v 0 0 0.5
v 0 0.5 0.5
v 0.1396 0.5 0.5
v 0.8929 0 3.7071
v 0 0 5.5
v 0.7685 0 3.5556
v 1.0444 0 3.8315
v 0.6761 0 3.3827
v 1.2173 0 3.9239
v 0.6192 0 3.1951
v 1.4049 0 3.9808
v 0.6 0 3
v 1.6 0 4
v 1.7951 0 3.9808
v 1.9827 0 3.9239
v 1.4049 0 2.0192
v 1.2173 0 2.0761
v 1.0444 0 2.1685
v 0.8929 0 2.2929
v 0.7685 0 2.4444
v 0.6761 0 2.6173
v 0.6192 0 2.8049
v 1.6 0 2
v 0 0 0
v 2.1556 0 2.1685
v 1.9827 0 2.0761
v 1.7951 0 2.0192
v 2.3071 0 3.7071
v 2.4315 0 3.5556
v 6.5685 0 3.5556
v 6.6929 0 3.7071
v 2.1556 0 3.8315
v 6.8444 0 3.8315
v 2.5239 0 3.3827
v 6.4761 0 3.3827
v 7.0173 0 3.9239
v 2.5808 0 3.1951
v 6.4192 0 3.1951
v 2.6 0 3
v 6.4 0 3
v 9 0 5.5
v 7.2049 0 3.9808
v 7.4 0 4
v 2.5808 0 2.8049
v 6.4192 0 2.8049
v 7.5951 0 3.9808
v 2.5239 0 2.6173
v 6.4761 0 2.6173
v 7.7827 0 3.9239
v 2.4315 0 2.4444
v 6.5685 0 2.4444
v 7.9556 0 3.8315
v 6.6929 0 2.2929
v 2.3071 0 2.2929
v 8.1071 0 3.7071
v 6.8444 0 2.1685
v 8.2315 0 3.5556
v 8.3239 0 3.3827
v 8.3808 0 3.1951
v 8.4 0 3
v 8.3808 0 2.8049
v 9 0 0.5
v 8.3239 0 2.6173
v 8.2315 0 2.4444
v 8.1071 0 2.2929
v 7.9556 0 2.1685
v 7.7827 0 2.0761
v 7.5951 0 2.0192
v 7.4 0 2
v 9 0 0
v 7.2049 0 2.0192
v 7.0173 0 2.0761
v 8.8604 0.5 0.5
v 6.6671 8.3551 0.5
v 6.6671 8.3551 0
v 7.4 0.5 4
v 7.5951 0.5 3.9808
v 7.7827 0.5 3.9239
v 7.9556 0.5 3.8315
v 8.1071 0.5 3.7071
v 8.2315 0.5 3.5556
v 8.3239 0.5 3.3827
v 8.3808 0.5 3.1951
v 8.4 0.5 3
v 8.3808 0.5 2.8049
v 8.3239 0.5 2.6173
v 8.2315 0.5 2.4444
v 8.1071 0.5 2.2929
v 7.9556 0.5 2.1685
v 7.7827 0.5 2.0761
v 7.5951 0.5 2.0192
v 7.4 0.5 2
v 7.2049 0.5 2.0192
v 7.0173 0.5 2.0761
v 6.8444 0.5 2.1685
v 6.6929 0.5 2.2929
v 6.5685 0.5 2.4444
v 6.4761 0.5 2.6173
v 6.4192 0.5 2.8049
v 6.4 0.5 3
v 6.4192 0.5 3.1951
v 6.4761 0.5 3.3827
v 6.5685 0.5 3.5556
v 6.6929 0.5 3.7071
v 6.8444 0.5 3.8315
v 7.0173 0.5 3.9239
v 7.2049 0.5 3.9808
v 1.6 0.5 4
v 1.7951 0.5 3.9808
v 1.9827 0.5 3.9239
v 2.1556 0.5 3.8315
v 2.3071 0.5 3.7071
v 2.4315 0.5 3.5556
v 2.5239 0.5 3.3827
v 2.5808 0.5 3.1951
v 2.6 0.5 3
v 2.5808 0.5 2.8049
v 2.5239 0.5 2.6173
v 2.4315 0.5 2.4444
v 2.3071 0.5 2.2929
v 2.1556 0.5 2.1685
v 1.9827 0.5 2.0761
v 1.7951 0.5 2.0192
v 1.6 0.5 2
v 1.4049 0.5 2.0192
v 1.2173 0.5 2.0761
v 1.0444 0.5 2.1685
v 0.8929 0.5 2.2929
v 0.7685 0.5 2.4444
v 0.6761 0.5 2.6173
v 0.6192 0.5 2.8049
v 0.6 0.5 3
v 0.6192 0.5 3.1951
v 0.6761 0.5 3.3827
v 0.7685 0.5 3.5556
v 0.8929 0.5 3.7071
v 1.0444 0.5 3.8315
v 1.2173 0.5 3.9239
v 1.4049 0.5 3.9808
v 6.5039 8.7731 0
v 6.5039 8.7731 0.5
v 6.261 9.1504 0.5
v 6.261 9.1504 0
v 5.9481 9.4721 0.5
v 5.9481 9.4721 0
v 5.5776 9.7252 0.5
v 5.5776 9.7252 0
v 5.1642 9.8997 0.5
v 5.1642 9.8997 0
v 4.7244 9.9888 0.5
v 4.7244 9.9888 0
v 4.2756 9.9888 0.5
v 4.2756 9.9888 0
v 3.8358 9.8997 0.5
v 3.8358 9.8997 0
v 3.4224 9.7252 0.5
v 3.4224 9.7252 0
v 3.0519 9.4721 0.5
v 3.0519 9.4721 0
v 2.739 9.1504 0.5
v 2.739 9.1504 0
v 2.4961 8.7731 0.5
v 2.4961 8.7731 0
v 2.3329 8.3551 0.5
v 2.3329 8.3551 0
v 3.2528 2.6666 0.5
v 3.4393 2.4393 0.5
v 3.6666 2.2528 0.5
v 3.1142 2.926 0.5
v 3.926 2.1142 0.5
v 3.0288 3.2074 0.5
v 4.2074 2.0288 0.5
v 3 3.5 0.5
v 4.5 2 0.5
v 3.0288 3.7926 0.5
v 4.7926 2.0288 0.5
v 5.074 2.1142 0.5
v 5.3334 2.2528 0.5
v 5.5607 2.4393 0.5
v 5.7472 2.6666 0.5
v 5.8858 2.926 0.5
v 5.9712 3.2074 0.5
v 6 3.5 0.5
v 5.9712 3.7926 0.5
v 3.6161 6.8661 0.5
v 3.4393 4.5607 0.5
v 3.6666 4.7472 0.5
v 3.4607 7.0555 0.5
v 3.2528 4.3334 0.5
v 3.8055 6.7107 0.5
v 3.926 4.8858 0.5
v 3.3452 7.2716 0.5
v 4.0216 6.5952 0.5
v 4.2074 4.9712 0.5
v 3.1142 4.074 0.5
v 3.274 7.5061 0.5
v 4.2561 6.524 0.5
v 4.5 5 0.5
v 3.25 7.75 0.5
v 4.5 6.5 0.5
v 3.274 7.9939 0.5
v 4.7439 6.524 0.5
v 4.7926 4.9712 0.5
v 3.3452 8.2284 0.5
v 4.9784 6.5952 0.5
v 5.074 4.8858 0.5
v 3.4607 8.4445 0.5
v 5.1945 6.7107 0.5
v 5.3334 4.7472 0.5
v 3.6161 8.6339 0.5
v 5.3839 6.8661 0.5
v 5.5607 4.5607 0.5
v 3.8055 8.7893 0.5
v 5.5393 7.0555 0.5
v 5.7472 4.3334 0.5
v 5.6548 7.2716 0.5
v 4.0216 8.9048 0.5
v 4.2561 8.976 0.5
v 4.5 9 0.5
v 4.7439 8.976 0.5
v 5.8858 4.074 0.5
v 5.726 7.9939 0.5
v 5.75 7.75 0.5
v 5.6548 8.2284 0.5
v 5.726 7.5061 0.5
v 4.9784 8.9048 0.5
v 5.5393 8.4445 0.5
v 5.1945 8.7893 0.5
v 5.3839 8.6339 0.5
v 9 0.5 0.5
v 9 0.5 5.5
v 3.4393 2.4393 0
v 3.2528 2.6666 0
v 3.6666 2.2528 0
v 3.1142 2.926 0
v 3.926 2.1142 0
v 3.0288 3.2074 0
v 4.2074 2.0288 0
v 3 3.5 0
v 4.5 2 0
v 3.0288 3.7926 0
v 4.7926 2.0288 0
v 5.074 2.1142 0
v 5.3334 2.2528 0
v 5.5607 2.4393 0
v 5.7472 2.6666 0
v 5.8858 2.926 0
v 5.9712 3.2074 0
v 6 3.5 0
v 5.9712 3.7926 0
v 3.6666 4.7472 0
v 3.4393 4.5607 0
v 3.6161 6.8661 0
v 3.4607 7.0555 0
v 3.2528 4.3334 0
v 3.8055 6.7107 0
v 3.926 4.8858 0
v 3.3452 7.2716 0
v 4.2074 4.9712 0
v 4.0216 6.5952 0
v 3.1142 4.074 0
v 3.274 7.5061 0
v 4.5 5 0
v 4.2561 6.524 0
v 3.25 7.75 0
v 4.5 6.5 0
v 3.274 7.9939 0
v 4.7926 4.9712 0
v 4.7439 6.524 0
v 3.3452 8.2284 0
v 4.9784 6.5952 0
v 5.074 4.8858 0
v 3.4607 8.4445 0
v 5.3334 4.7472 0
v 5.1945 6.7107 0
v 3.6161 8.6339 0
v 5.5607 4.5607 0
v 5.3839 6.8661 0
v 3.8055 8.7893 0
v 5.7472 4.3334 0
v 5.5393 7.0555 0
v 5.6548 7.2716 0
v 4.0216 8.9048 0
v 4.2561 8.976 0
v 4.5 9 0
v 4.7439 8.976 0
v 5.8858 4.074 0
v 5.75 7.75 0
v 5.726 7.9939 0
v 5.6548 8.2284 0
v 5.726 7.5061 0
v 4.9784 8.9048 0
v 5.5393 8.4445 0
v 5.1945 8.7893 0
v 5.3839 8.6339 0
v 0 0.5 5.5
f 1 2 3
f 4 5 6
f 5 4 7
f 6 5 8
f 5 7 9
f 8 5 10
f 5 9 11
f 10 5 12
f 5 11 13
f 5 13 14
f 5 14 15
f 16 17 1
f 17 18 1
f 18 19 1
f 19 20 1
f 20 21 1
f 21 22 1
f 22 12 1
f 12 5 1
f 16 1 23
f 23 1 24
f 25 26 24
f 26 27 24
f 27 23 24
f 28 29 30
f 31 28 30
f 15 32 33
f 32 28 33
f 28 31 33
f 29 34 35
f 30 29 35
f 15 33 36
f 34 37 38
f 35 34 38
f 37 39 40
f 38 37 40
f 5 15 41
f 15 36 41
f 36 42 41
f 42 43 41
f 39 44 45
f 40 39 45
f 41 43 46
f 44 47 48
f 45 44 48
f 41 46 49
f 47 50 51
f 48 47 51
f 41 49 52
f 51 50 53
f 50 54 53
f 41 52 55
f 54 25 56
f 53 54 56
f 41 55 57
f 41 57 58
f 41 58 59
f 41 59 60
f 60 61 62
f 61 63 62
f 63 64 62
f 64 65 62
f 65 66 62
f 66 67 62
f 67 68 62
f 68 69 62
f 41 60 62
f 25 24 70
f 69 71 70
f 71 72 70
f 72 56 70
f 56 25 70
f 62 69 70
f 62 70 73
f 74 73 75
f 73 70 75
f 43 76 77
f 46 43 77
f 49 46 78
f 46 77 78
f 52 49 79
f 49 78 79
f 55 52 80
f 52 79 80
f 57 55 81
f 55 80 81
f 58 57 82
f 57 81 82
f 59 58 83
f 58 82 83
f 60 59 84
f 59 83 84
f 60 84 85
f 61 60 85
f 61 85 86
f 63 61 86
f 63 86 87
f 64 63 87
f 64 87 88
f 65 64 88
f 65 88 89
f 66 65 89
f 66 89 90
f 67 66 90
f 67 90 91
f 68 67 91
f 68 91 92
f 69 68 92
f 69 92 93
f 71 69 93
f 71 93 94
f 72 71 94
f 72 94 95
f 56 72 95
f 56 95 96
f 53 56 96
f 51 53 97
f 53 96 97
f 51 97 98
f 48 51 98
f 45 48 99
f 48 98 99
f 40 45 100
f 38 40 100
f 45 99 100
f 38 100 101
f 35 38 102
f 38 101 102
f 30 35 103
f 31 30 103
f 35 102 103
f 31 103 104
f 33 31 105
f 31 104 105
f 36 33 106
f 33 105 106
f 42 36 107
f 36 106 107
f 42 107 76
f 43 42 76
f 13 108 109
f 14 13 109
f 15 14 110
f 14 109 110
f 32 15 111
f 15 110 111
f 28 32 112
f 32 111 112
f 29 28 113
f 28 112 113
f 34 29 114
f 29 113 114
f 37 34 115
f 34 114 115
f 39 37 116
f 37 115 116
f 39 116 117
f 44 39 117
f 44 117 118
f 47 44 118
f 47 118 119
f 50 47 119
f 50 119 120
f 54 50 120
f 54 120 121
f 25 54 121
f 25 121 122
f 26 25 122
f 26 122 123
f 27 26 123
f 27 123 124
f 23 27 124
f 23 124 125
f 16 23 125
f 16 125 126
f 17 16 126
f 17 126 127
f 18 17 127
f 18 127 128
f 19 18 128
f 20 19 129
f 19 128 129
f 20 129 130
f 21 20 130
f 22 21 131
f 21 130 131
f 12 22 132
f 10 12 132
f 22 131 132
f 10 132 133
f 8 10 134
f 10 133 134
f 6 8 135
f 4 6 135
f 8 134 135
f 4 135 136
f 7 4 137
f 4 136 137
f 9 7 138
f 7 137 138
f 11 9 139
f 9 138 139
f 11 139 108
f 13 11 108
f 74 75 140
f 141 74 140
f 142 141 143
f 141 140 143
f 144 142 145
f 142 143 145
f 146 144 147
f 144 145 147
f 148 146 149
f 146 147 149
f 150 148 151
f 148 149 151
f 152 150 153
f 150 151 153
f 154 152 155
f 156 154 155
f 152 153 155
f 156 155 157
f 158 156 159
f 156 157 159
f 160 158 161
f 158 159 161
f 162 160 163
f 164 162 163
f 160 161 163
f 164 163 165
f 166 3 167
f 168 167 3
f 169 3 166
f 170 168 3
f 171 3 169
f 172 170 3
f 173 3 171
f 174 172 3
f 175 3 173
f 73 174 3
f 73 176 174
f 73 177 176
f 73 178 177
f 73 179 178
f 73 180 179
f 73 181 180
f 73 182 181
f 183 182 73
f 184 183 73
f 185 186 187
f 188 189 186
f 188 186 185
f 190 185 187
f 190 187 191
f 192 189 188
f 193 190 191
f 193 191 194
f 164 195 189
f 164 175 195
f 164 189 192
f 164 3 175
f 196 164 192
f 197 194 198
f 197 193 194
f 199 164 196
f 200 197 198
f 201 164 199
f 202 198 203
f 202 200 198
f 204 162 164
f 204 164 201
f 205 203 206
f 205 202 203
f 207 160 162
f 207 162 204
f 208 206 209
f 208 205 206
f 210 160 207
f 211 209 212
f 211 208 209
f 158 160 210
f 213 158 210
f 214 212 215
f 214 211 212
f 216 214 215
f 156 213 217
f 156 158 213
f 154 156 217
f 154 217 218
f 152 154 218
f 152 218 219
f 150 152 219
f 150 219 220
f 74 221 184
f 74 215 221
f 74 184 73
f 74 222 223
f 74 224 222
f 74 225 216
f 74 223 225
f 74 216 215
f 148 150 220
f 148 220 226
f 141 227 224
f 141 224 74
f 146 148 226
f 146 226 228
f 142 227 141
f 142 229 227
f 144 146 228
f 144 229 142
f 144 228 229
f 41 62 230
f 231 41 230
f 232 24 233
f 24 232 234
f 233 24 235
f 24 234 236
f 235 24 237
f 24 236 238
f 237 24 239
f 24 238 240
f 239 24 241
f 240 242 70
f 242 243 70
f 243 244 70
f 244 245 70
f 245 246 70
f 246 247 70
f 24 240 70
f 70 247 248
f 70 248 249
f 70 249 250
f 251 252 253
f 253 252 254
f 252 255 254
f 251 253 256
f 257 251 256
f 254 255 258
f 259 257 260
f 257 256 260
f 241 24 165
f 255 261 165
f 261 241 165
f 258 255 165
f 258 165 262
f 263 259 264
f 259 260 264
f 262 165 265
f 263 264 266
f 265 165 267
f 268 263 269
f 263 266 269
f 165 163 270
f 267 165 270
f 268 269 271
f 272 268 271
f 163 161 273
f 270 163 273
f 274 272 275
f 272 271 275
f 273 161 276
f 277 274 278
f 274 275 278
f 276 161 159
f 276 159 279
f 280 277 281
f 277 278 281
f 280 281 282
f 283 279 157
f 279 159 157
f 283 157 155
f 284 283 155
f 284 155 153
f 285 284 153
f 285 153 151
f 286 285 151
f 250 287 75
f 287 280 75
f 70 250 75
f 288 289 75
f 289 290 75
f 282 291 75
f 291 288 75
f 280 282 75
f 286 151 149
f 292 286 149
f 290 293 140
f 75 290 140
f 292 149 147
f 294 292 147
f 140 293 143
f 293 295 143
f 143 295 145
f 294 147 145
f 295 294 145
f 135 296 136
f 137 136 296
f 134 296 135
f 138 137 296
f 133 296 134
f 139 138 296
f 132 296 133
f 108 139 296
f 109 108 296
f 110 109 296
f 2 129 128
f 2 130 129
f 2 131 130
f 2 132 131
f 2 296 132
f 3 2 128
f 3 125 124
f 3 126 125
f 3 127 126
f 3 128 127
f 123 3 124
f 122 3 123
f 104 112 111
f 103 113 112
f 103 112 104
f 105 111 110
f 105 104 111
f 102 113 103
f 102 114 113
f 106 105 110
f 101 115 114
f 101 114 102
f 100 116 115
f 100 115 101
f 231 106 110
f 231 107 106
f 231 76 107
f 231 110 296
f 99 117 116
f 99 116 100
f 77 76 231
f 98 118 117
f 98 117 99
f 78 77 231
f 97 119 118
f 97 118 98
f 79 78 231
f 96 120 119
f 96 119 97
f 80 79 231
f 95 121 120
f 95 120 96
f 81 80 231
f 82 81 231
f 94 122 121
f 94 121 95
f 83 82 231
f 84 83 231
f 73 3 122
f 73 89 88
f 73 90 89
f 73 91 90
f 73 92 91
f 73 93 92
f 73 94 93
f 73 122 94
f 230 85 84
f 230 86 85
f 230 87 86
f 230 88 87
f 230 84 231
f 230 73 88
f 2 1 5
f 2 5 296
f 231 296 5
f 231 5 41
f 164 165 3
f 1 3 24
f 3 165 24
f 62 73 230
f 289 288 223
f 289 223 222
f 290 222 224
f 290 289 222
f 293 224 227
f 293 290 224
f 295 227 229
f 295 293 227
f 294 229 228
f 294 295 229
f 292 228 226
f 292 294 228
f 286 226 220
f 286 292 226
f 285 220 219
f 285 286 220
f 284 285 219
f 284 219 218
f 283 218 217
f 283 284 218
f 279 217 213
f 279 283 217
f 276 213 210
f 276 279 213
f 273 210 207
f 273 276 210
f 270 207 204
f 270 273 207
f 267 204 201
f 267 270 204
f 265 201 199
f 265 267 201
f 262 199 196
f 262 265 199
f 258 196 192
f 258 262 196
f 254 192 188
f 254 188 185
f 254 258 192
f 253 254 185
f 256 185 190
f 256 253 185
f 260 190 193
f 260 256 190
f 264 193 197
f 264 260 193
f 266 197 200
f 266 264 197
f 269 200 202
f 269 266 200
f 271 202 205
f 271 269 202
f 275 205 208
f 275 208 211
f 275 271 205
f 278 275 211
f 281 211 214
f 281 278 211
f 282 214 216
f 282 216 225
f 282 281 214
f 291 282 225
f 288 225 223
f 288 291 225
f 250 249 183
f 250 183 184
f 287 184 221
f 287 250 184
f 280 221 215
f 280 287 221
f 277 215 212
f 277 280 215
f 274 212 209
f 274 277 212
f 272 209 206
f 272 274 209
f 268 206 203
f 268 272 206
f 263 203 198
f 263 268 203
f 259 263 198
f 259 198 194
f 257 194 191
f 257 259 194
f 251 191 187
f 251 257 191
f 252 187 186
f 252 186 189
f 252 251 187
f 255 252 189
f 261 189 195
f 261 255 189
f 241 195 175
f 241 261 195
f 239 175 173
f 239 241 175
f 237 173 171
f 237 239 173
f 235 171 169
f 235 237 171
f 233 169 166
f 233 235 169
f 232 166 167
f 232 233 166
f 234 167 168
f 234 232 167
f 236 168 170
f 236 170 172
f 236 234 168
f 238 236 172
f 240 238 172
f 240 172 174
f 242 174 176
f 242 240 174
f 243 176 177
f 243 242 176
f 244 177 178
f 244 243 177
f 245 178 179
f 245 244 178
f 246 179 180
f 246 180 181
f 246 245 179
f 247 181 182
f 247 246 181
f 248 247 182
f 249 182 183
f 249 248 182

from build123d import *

# Parameters (mm, degrees)
SKETCH_1_R          = 1.25
SKETCH_1_R_2        = 1.5
EXTRUDE_1_DEPTH     = 0.5
SKETCH_2_W          = 9
SKETCH_2_H          = 0.5
EXTRUDE_2_DEPTH     = 5
CUT_EXTRUDE_1_REACH = 16.195
SKETCH_3_R          = 1


with BuildPart() as part:
    # 草图1 → 凸台-拉伸1 (new body)
    with BuildSketch(Plane.XY):
        with BuildLine():
            Line((0, 0), (9, 0))
            Line((9, 0), (6.667108595, 8.355095313))
            ThreePointArc((6.667108595, 8.355095313), (4.5, 10), (2.332891405, 8.355095313))
            Line((2.332891405, 8.355095313), (0, 0))
        make_face()
        with Locations((4.5, 7.75)):
            Circle(SKETCH_1_R, mode=Mode.SUBTRACT)
        with Locations((4.5, 3.5)):
            Circle(SKETCH_1_R_2, mode=Mode.SUBTRACT)
    extrude(amount=EXTRUDE_1_DEPTH)

    # 草图2 → 凸台-拉伸2 (add)
    with BuildSketch(Plane.XY.offset(0.5)):
        with Locations((4.5, 0.25)):
            Rectangle(SKETCH_2_W, SKETCH_2_H)
    extrude(amount=EXTRUDE_2_DEPTH)

    # 草图3 → 切除-拉伸1 (cut, up to next)
    with BuildSketch(Plane(origin=(0, 0.5, 0), x_dir=(1, 0, 0), z_dir=(0, 1, 0)), mode=Mode.PRIVATE) as cut_extrude_1_sk1:
        with Locations(Location((1.6, -3, 0), (0, 0, 270))):
            Circle(SKETCH_3_R)
    cut_extrude_1_tool1 = extrude(cut_extrude_1_sk1.sketch, amount=-CUT_EXTRUDE_1_REACH, mode=Mode.PRIVATE) & part.part
    # 草图3 → 切除-拉伸1 (cut, up to next)
    with BuildSketch(Plane(origin=(0, 0.5, 0), x_dir=(1, 0, 0), z_dir=(0, 1, 0)), mode=Mode.PRIVATE) as cut_extrude_1_sk2:
        with Locations(Location((7.4, -3, 0), (0, 0, 270))):
            Circle(SKETCH_3_R)
    cut_extrude_1_tool2 = extrude(cut_extrude_1_sk2.sketch, amount=-CUT_EXTRUDE_1_REACH, mode=Mode.PRIVATE) & part.part
    add(cut_extrude_1_tool1.solids().sort_by_distance((1.6, 0.5, 3))[0], mode=Mode.SUBTRACT)
    add(cut_extrude_1_tool2.solids().sort_by_distance((7.4, 0.5, 3))[0], mode=Mode.SUBTRACT)


solid = part.part
